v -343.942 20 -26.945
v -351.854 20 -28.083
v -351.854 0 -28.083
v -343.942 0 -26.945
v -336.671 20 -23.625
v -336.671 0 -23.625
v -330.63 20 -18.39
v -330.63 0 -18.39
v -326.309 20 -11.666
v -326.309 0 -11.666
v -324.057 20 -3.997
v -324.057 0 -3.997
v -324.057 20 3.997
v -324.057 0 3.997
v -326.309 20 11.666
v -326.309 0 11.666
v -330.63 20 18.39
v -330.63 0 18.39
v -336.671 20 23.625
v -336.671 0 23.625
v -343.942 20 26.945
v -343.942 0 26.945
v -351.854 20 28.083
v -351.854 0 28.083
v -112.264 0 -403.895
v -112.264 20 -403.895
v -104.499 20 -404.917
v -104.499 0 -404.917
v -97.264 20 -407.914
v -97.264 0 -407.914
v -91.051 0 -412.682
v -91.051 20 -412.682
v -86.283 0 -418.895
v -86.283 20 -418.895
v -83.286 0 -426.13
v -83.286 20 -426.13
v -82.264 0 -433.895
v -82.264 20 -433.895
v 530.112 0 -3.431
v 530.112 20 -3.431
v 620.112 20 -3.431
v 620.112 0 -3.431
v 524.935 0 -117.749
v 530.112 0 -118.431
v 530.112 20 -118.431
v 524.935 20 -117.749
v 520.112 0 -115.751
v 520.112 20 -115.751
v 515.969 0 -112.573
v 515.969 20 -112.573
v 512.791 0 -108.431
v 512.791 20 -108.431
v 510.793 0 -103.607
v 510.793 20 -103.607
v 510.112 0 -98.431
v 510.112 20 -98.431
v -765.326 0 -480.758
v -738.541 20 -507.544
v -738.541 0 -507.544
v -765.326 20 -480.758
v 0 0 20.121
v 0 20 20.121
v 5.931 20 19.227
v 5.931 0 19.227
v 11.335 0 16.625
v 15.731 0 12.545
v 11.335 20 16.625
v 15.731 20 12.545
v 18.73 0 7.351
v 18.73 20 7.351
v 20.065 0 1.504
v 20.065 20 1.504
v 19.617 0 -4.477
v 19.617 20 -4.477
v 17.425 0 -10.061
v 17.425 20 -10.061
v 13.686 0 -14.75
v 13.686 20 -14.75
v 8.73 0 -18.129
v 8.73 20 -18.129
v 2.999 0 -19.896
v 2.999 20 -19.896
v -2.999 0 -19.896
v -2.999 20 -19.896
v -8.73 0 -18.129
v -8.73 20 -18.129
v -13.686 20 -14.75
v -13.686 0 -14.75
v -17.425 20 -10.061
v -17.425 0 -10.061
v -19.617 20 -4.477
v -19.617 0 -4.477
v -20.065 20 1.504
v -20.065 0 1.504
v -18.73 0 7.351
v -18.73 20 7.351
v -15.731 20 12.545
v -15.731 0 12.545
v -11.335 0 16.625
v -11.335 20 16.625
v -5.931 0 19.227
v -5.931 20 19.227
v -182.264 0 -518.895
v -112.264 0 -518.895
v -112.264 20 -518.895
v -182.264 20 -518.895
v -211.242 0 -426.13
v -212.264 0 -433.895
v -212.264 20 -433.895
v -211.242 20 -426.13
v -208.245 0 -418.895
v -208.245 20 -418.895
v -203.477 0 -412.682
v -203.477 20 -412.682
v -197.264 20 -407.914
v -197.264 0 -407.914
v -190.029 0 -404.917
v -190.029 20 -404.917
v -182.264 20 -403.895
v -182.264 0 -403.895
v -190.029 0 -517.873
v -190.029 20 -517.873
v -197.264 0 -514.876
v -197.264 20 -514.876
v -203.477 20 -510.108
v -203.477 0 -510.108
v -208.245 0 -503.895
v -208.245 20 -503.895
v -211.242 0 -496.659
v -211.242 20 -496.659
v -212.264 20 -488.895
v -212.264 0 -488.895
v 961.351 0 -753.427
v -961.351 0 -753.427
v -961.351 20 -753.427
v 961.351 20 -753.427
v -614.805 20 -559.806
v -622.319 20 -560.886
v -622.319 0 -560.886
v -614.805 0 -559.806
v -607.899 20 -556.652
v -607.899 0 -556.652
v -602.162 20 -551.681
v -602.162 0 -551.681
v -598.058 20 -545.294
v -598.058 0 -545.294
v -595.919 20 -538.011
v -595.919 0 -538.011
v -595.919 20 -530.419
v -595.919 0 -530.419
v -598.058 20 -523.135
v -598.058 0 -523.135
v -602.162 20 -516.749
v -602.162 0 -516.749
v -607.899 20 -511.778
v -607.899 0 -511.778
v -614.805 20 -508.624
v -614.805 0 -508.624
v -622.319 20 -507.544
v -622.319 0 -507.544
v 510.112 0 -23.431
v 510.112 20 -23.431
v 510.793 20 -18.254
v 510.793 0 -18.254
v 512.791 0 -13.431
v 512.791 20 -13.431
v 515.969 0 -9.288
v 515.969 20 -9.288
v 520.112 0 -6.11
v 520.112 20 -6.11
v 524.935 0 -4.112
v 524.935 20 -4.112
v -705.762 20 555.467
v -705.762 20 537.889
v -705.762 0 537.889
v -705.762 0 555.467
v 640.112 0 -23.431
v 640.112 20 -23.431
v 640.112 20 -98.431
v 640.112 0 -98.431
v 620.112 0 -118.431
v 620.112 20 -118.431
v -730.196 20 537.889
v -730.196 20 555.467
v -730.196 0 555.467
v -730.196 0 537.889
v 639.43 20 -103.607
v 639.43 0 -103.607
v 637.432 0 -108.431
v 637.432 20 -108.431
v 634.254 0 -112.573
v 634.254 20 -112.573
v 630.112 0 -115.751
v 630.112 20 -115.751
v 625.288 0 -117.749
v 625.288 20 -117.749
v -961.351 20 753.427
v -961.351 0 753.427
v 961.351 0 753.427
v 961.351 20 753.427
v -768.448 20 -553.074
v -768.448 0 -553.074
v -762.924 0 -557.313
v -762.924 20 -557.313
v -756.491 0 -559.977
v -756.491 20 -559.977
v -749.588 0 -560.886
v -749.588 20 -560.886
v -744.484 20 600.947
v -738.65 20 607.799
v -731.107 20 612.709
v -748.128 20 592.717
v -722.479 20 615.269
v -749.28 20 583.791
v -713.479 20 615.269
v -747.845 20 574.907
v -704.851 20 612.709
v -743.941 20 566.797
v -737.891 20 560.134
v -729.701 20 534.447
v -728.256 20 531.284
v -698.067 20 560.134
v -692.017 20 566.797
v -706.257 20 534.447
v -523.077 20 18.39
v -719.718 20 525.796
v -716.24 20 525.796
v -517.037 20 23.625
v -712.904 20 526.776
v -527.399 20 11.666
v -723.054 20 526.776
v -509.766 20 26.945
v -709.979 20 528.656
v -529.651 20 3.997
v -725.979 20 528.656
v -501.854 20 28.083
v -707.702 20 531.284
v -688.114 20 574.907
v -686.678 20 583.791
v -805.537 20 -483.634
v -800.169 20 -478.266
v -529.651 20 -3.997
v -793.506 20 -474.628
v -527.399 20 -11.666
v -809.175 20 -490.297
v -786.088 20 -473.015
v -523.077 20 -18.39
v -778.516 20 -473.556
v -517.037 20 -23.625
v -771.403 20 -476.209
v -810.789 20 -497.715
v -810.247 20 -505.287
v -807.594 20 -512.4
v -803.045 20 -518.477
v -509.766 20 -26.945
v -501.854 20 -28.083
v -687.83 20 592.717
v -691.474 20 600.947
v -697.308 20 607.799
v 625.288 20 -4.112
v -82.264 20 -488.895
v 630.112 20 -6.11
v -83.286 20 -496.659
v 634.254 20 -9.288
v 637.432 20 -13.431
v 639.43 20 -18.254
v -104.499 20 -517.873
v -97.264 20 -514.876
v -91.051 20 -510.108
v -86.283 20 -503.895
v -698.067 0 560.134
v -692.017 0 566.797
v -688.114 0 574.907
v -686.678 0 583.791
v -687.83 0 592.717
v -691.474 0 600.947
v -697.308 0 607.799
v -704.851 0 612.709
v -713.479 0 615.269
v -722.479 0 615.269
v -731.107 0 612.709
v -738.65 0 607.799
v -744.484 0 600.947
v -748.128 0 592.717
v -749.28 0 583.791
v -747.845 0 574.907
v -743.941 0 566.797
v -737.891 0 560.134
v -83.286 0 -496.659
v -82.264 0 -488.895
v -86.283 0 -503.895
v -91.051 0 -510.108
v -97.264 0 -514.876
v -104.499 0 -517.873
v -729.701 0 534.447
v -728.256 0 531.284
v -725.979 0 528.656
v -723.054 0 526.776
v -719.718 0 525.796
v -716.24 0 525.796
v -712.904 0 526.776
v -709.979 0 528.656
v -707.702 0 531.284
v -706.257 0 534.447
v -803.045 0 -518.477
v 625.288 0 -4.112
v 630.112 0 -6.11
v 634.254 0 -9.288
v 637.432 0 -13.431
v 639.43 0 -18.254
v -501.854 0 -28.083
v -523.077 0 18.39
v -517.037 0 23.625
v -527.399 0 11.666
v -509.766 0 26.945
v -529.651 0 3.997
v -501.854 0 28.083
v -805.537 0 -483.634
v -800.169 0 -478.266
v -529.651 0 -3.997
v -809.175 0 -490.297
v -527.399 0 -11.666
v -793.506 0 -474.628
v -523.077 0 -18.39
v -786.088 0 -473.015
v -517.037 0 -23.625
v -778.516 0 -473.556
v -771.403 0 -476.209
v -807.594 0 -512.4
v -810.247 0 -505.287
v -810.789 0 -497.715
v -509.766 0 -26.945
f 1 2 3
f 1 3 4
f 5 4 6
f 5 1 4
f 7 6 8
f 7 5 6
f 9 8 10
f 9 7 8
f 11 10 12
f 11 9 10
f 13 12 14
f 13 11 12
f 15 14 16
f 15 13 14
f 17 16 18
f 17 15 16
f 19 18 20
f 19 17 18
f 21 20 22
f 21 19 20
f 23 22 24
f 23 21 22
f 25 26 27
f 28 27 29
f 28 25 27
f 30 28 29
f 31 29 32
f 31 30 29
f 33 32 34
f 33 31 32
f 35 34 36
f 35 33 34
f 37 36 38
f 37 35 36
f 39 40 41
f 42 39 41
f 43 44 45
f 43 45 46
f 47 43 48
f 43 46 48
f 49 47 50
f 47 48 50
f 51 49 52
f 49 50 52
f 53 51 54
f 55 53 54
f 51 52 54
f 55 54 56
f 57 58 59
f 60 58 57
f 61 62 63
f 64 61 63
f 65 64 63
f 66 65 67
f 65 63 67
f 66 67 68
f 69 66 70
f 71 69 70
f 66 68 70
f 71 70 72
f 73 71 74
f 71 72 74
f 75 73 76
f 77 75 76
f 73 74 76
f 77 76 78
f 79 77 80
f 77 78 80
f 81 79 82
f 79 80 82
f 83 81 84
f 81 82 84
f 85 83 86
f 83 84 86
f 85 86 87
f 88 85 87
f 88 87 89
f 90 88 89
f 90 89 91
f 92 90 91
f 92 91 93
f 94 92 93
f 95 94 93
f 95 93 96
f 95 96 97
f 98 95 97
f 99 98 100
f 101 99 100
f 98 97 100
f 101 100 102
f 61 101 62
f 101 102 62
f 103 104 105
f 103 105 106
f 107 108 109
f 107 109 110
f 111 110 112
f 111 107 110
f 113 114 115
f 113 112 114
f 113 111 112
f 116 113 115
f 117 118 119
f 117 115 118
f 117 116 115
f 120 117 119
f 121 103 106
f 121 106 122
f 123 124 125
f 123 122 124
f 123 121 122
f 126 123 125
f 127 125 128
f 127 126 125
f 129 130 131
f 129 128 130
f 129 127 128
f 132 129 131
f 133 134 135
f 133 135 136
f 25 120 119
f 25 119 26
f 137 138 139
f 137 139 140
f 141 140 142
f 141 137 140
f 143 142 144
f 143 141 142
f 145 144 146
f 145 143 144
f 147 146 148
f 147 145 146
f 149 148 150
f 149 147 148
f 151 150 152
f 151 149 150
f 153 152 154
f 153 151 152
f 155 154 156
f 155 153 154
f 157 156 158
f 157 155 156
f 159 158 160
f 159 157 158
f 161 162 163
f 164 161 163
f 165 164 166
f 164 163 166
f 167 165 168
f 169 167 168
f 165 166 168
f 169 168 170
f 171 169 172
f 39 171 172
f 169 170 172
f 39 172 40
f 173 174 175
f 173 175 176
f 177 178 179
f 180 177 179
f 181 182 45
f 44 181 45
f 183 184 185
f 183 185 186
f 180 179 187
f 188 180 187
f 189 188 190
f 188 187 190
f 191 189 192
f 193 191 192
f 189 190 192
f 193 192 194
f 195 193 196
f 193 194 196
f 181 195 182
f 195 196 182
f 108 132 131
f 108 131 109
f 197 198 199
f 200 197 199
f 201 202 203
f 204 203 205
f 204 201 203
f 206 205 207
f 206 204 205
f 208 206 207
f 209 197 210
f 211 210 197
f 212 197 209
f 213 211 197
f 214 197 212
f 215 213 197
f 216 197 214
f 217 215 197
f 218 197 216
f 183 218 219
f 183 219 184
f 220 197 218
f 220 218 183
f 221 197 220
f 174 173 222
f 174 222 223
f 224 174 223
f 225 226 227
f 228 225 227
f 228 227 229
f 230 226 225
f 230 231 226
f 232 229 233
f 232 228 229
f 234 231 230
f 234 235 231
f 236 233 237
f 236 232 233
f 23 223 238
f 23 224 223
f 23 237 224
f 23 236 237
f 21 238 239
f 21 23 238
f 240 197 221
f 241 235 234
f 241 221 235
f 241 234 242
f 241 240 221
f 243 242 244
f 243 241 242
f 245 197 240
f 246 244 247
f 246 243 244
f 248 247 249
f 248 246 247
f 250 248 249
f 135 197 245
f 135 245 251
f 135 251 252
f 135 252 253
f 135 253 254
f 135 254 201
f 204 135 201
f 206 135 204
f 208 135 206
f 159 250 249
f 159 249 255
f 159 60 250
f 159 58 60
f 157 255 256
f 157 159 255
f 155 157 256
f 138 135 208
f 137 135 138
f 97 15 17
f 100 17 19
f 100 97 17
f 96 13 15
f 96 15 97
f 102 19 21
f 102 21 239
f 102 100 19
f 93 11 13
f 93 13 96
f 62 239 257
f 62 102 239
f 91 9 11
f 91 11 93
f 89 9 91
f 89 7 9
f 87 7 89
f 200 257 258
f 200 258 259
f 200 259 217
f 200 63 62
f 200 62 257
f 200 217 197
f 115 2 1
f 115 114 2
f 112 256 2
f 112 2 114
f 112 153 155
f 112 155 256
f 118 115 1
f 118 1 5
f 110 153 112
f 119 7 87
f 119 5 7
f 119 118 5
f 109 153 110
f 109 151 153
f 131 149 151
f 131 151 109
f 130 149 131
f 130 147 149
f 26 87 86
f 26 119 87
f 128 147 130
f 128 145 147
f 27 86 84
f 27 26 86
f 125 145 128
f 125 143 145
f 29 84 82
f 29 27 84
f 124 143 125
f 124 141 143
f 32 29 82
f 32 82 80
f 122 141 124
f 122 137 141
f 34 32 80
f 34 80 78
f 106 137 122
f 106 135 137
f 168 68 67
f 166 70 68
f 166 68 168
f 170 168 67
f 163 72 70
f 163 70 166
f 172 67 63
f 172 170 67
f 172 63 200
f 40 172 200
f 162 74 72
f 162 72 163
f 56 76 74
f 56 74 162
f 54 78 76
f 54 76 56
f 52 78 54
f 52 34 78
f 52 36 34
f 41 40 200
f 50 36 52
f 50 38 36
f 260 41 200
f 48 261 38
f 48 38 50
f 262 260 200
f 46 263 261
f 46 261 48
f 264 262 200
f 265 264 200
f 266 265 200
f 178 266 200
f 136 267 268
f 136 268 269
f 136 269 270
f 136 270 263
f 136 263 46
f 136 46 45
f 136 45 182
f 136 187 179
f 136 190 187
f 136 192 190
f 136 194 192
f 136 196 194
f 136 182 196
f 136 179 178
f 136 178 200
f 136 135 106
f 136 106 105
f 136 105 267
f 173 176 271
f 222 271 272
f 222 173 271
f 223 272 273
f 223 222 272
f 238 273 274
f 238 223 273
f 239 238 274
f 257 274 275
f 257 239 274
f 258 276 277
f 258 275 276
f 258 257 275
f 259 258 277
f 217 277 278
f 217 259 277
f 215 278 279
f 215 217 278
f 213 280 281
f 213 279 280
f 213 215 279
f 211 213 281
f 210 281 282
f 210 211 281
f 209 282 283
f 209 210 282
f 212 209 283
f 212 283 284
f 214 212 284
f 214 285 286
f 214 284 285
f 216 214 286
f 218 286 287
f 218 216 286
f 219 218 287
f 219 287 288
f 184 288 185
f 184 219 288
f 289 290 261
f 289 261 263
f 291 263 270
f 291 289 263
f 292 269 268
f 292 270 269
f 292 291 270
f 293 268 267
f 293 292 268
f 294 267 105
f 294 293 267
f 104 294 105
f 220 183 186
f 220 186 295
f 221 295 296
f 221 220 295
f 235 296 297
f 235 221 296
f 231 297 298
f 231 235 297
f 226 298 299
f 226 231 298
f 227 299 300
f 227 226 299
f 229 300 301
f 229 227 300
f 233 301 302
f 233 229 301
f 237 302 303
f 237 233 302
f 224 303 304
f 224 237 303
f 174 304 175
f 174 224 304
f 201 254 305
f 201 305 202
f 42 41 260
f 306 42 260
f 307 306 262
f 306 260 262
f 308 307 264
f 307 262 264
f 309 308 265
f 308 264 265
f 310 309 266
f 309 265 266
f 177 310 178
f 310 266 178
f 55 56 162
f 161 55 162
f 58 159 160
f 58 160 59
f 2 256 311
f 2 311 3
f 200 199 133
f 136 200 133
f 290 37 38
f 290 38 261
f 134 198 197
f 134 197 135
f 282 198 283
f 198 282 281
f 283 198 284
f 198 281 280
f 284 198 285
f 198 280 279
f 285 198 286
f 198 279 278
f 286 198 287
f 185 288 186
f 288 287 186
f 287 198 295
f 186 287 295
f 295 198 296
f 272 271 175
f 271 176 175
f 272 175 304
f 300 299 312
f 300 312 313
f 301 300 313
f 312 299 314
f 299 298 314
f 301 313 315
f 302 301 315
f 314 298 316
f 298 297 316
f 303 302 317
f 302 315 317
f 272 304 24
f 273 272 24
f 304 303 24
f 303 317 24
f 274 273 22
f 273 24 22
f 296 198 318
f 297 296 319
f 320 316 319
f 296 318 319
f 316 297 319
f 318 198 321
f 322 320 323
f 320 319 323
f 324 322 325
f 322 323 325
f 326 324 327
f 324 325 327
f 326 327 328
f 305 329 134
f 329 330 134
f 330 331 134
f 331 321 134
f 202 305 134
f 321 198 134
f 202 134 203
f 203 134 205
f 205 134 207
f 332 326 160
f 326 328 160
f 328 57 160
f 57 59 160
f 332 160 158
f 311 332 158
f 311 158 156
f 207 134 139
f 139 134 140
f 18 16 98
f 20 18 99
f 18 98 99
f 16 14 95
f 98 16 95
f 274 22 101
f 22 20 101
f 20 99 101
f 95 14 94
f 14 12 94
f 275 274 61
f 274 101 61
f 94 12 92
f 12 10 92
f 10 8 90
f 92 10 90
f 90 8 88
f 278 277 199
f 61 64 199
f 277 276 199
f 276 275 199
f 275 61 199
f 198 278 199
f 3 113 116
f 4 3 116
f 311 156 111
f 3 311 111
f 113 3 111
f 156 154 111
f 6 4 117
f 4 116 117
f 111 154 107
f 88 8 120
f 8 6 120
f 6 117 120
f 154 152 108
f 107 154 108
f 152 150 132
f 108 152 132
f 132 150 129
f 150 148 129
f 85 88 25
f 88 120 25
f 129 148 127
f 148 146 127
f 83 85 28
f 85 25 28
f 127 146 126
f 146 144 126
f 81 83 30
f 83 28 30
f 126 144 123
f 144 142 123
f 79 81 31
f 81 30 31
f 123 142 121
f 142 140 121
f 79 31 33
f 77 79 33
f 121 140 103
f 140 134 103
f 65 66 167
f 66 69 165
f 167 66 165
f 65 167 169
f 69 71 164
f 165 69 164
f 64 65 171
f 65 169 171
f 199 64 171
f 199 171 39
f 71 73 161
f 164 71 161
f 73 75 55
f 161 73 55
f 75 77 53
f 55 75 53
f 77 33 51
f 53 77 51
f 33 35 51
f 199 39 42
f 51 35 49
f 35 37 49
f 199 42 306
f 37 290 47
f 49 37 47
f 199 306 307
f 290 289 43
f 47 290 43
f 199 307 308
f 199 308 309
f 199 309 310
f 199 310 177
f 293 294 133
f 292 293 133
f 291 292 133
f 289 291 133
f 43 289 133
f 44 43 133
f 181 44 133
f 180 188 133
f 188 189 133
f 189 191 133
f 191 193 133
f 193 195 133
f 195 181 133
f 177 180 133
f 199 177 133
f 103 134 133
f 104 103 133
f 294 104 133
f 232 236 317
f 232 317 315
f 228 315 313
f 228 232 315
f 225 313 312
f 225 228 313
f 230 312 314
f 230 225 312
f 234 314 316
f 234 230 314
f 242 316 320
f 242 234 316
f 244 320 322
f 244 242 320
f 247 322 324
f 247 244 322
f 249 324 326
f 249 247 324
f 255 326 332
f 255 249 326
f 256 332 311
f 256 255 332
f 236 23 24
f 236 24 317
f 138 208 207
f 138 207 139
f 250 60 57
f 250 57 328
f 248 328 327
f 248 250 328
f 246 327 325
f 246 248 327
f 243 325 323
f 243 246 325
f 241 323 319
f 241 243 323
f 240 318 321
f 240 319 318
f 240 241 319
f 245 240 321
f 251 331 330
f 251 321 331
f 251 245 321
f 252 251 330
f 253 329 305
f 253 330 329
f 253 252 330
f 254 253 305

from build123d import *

# Parameters (mm, degrees)
SKETCH1_W               = 1922.702167778
SKETCH1_H               = 1506.854577214
BOSS_EXTRUDE1_DEPTH     = 20
SKETCH2_R               = 20.121201263
CUT_EXTRUDE1_DEPTH      = 20
CUT_EXTRUDE2_DEPTH      = 1222.576270935
CUT_EXTRUDE3_DEPTH      = 1222.576270935
CUT_EXTRUDE4_DEPTH      = 1222.576270935
CUT_EXTRUDE4_DEPTH_BACK = 1222.576270935
CUT_EXTRUDE5_DEPTH      = 1222.576270935
CUT_EXTRUDE6_DEPTH      = 1222.576270935


with BuildPart() as part:
    # Sketch1 → Boss-Extrude1 (new body)
    with BuildSketch(Plane(origin=(0, 0, 0), x_dir=(1, 0, 0), z_dir=(0, 1, 0))):
        Rectangle(SKETCH1_W, SKETCH1_H)
    extrude(amount=BOSS_EXTRUDE1_DEPTH)

    # Sketch2 → Cut-Extrude1 (cut)
    with BuildSketch(Plane(origin=(0, 20, 0), x_dir=(1, 0, 0), z_dir=(0, 1, 0))):
        with Locations(Location((0, 0, 0), (0, 0, 270))):
            Circle(SKETCH2_R)
    extrude(amount=-CUT_EXTRUDE1_DEPTH, mode=Mode.SUBTRACT)

    # Sketch3 → Cut-Extrude2 (cut, through all)
    with BuildSketch(Plane(origin=(0, 20, 0), x_dir=(1, 0, 0), z_dir=(0, 1, 0))):
        with BuildLine():
            Line((-501.853893247, 28.082670062), (-351.853893247, 28.082670062))
            ThreePointArc((-351.853893247, 28.082670062), (-323.771223185, 0), (-351.853893247, -28.082670062))
            Line((-351.853893247, -28.082670062), (-501.853893247, -28.082670062))
            ThreePointArc((-501.853893247, -28.082670062), (-529.936563308, 0), (-501.853893247, 28.082670062))
        make_face()
    extrude(amount=-CUT_EXTRUDE2_DEPTH, mode=Mode.SUBTRACT)

    # Sketch4 → Cut-Extrude3 (cut, through all)
    with BuildSketch(Plane(origin=(0, 20, 0), x_dir=(1, 0, 0), z_dir=(0, 1, 0))):
        with BuildLine():
            Line((530.111507452, 3.430580165), (620.111507452, 3.430580165))
            ThreePointArc((620.111507452, 3.430580165), (634.253643076, 9.288444541), (640.111507452, 23.430580165))
            Line((640.111507452, 23.430580165), (640.111507452, 98.430580165))
            ThreePointArc((640.111507452, 98.430580165), (634.253643076, 112.572715788), (620.111507452, 118.430580165))
            Line((620.111507452, 118.430580165), (530.111507452, 118.430580165))
            ThreePointArc((530.111507452, 118.430580165), (515.969371828, 112.572715788), (510.111507452, 98.430580165))
            Line((510.111507452, 98.430580165), (510.111507452, 23.430580165))
            ThreePointArc((510.111507452, 23.430580165), (515.969371828, 9.288444541), (530.111507452, 3.430580165))
        make_face()
    extrude(amount=-CUT_EXTRUDE3_DEPTH, mode=Mode.SUBTRACT)

    # Sketch5 → Cut-Extrude4 (cut, two sides: drawn at the far end of the back side and taken through both)
    with BuildSketch(Plane(origin=(0, 20, 0), x_dir=(1, 0, 0), z_dir=(0, 1, 0)).offset(-CUT_EXTRUDE4_DEPTH_BACK)):
        with BuildLine():
            Line((-182.264012939, 403.894827106), (-112.264012939, 403.894827106))
            ThreePointArc((-112.264012939, 403.894827106), (-91.050809503, 412.681623671), (-82.264012939, 433.894827106))
            Line((-82.264012939, 433.894827106), (-82.264012939, 488.894827106))
            ThreePointArc((-82.264012939, 488.894827106), (-91.050809503, 510.108030542), (-112.264012939, 518.894827106))
            Line((-112.264012939, 518.894827106), (-182.264012939, 518.894827106))
            ThreePointArc((-182.264012939, 518.894827106), (-203.477216375, 510.108030542), (-212.264012939, 488.894827106))
            Line((-212.264012939, 488.894827106), (-212.264012939, 433.894827106))
            ThreePointArc((-212.264012939, 433.894827106), (-203.477216375, 412.681623671), (-182.264012939, 403.894827106))
        make_face()
    extrude(amount=CUT_EXTRUDE4_DEPTH + CUT_EXTRUDE4_DEPTH_BACK, mode=Mode.SUBTRACT)

    # Sketch6 → Cut-Extrude5 (cut, through all)
    with BuildSketch(Plane(origin=(0, 20, 0), x_dir=(1, 0, 0), z_dir=(0, 1, 0))):
        with BuildLine():
            Line((-803.044857879, 518.477090235), (-768.447719913, 553.074228201))
            ThreePointArc((-768.447719913, 553.074228201), (-759.794991438, 558.855796528), (-749.588402288, 560.886013339))
            Line((-749.588402288, 560.886013339), (-622.318858343, 560.886013339))
            ThreePointArc((-622.318858343, 560.886013339), (-595.647755579, 534.214910576), (-622.318858343, 507.543807813))
            Line((-622.318858343, 507.543807813), (-738.5408698, 507.543807813))
            Line((-738.5408698, 507.543807813), (-765.326222628, 480.758454984))
            ThreePointArc((-765.326222628, 480.758454984), (-803.044857879, 480.758454984), (-803.044857879, 518.477090235))
        make_face()
    extrude(amount=-CUT_EXTRUDE5_DEPTH, mode=Mode.SUBTRACT)

    # Sketch8 → Cut-Extrude6 (cut, through all)
    with BuildSketch(Plane(origin=(0, 20, 0), x_dir=(1, 0, 0), z_dir=(0, 1, 0))):
        with BuildLine():
            Line((-730.19585764, -555.467097942), (-730.19585764, -537.888913931))
            ThreePointArc((-730.19585764, -537.888913931), (-717.979020313, -525.672076605), (-705.762182987, -537.888913931))
            Line((-705.762182987, -537.888913931), (-705.762182987, -555.467097942))
            ThreePointArc((-705.762182987, -555.467097942), (-717.979020313, -615.594356546), (-730.19585764, -555.467097942))
        make_face()
    extrude(amount=-CUT_EXTRUDE6_DEPTH, mode=Mode.SUBTRACT)


solid = part.part
